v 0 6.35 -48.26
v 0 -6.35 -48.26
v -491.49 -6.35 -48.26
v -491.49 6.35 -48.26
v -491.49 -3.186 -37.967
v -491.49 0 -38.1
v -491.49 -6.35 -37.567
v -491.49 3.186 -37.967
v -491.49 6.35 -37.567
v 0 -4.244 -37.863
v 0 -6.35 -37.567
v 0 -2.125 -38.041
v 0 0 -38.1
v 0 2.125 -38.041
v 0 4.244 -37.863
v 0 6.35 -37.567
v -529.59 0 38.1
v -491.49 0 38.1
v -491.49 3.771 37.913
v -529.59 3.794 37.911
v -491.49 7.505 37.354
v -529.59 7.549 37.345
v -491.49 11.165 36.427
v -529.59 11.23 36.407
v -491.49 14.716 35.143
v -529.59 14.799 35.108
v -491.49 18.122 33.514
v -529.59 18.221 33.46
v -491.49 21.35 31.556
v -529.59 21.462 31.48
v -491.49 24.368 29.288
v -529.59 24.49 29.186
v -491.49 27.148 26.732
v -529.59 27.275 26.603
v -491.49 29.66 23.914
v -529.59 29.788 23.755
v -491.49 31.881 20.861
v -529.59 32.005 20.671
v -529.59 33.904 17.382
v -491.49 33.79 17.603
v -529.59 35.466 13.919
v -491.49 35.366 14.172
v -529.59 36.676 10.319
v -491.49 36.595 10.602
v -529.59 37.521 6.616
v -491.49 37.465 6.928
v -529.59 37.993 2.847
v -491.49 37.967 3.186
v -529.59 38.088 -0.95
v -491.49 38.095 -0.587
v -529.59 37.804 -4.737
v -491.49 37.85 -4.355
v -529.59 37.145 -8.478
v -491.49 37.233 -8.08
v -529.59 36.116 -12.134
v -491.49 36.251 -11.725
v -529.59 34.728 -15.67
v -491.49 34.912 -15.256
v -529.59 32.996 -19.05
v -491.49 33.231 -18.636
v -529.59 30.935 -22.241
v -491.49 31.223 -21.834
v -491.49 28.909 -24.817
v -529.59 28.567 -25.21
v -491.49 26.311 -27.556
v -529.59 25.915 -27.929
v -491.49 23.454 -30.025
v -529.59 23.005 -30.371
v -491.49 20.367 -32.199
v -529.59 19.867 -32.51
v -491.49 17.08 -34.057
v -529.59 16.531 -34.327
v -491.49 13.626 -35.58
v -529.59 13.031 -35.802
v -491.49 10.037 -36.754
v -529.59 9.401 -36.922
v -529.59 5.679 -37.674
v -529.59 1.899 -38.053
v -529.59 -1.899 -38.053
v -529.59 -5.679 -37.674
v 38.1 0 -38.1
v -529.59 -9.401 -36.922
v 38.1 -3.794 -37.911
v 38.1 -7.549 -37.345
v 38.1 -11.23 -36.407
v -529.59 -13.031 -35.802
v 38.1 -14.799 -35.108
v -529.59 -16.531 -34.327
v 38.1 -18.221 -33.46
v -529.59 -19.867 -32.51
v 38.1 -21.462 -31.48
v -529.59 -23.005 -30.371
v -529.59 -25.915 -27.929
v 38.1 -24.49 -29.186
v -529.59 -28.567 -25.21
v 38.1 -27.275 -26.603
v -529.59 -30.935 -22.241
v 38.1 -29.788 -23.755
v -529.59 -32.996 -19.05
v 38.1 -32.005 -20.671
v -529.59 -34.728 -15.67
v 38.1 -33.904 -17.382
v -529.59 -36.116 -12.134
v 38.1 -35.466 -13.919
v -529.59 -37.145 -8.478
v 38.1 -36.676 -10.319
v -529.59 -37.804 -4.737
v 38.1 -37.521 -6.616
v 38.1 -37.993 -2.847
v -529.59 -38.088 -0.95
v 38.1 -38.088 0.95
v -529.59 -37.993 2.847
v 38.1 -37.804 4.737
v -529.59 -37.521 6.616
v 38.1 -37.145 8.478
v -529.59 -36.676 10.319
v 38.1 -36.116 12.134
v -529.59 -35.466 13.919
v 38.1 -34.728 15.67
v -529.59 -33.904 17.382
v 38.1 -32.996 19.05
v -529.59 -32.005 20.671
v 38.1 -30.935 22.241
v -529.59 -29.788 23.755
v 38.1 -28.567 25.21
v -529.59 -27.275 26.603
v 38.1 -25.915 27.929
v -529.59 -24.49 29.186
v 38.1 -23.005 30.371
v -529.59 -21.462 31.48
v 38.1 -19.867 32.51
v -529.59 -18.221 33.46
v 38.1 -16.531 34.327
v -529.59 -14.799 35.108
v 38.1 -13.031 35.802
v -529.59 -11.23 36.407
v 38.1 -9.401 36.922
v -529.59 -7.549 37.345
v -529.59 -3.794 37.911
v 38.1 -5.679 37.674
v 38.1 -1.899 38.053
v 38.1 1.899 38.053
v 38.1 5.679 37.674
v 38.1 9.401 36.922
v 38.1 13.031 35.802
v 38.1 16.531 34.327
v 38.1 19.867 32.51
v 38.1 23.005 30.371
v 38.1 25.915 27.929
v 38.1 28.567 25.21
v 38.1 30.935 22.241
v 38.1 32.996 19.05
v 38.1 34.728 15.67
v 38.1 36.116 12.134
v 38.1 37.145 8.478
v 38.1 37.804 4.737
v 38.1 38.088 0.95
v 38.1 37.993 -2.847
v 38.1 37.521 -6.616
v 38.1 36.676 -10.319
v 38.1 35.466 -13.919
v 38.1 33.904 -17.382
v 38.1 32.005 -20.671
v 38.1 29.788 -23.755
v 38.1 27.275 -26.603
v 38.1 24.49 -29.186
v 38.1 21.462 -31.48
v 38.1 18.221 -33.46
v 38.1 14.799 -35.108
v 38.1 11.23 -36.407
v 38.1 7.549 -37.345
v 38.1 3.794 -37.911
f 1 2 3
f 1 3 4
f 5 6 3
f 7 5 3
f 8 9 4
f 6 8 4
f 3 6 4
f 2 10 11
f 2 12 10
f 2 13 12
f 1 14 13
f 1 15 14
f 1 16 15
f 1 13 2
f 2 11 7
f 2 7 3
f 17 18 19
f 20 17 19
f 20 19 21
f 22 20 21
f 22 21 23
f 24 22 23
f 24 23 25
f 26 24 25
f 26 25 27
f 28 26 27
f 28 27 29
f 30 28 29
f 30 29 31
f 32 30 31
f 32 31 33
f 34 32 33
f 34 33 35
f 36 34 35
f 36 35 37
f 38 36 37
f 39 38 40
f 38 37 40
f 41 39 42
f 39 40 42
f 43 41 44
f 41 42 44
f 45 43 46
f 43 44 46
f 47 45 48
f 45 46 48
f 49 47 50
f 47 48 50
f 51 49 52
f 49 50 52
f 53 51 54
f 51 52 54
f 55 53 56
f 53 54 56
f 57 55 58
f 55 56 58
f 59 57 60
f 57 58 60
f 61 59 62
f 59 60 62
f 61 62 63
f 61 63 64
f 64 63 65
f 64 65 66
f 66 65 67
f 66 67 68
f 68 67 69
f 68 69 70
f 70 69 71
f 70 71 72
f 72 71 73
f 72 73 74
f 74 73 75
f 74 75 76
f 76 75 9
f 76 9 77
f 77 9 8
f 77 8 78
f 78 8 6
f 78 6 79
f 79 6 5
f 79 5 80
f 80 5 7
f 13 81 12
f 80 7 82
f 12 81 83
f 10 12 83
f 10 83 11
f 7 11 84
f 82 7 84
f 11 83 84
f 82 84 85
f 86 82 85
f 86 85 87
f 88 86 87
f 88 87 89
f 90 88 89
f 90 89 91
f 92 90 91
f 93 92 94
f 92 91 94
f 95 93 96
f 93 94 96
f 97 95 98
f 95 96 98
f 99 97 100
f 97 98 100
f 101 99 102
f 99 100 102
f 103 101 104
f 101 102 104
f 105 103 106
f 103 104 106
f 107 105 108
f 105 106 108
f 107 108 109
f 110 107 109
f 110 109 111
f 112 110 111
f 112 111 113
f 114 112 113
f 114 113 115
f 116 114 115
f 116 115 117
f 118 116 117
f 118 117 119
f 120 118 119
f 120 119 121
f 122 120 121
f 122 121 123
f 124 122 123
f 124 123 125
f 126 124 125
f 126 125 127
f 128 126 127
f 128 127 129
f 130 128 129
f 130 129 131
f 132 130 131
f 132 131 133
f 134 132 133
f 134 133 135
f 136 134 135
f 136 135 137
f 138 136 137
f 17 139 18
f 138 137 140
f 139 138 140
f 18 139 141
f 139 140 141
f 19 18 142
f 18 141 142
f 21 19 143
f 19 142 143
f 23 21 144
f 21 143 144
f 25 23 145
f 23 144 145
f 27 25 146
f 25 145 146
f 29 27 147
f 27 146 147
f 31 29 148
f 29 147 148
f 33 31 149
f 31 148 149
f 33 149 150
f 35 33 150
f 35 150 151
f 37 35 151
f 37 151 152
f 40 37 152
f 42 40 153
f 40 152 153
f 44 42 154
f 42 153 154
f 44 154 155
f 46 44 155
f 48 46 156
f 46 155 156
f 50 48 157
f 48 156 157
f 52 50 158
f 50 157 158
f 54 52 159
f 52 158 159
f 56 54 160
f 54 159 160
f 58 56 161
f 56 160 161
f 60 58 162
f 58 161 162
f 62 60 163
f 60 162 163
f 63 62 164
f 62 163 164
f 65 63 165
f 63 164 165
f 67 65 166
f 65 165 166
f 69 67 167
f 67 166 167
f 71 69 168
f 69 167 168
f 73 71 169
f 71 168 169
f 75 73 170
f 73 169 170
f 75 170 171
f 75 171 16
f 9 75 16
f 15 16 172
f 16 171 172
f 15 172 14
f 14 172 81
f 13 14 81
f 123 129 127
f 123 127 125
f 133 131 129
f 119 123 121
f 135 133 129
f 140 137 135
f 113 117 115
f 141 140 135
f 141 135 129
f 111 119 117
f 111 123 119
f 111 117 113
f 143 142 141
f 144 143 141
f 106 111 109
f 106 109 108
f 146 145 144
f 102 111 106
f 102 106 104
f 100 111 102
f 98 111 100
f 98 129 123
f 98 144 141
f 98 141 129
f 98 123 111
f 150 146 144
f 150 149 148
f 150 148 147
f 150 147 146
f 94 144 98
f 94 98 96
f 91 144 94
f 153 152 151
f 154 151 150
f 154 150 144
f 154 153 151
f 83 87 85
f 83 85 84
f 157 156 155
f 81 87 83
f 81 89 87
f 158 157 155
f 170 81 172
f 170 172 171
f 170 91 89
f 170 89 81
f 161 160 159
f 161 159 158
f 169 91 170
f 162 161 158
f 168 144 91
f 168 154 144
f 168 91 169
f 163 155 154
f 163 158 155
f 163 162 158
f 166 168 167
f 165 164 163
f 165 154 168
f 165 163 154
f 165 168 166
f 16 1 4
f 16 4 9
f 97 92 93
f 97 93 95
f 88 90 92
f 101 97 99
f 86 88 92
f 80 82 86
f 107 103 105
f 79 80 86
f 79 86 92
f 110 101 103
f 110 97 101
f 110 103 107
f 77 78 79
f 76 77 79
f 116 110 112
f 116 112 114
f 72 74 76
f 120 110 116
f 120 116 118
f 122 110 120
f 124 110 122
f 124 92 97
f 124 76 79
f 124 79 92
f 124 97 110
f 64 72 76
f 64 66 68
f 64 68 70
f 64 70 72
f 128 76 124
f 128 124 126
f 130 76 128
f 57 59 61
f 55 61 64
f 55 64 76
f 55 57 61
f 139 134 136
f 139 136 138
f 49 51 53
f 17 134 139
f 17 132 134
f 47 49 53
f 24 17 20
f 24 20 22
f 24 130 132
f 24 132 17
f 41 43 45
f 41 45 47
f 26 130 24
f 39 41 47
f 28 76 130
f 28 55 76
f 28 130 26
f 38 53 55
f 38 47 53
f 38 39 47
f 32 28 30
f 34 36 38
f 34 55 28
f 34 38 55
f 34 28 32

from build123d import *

# Parameters (mm, degrees)
BOSS_EXTRUDE1_DEPTH = 491.49
SKETCH2_R           = 38.1
BOSS_EXTRUDE2_DEPTH = 38.1
SKETCH3_R           = 38.1
BOSS_EXTRUDE3_DEPTH = 38.1


with BuildPart() as part:
    # Sketch1 → Boss-Extrude1 (new body)
    with BuildSketch(Plane(origin=(0, 0, 0), x_dir=(0, 0, -1), z_dir=(1, 0, 0))):
        with BuildLine():
            Line((27.94, 6.35), (27.94, -6.35))
            Line((27.94, -6.35), (37.567106623, -6.35))
            ThreePointArc((37.567106623, -6.35), (37.966542918, -3.186160517), (38.1, 0))
            ThreePointArc((38.1, 0), (37.966542918, 3.186160517), (37.567106623, 6.35))
            Line((37.567106623, 6.35), (27.94, 6.35))
        make_face()
        with BuildLine():
            Line((37.567106623, -6.35), (27.94, -6.35))
            Line((27.94, -6.35), (27.94, 6.35))
            Line((27.94, 6.35), (37.567106623, 6.35))
            ThreePointArc((37.567106623, 6.35), (-38.1, 0), (37.567106623, -6.35))
        make_face()
        with BuildLine():
            ThreePointArc((38.1, 0), (37.966542918, -3.186160517), (37.567106623, -6.35))
            Line((37.567106623, -6.35), (48.26, -6.35))
            Line((48.26, -6.35), (48.26, 6.35))
            Line((48.26, 6.35), (37.567106623, 6.35))
            ThreePointArc((37.567106623, 6.35), (37.966542918, 3.186160517), (38.1, 0))
        make_face()
    extrude(amount=-BOSS_EXTRUDE1_DEPTH)

    # Sketch2 → Boss-Extrude2 (add)
    with BuildSketch(Plane(origin=(0, 0, 0), x_dir=(0, 0, -1), z_dir=(1, 0, 0))):
        Circle(SKETCH2_R)
    extrude(amount=BOSS_EXTRUDE2_DEPTH)

    # Sketch3 → Boss-Extrude3 (add)
    with BuildSketch(Plane.ZY.offset(491.49)):
        Circle(SKETCH3_R)
    extrude(amount=BOSS_EXTRUDE3_DEPTH)


solid = part.part
